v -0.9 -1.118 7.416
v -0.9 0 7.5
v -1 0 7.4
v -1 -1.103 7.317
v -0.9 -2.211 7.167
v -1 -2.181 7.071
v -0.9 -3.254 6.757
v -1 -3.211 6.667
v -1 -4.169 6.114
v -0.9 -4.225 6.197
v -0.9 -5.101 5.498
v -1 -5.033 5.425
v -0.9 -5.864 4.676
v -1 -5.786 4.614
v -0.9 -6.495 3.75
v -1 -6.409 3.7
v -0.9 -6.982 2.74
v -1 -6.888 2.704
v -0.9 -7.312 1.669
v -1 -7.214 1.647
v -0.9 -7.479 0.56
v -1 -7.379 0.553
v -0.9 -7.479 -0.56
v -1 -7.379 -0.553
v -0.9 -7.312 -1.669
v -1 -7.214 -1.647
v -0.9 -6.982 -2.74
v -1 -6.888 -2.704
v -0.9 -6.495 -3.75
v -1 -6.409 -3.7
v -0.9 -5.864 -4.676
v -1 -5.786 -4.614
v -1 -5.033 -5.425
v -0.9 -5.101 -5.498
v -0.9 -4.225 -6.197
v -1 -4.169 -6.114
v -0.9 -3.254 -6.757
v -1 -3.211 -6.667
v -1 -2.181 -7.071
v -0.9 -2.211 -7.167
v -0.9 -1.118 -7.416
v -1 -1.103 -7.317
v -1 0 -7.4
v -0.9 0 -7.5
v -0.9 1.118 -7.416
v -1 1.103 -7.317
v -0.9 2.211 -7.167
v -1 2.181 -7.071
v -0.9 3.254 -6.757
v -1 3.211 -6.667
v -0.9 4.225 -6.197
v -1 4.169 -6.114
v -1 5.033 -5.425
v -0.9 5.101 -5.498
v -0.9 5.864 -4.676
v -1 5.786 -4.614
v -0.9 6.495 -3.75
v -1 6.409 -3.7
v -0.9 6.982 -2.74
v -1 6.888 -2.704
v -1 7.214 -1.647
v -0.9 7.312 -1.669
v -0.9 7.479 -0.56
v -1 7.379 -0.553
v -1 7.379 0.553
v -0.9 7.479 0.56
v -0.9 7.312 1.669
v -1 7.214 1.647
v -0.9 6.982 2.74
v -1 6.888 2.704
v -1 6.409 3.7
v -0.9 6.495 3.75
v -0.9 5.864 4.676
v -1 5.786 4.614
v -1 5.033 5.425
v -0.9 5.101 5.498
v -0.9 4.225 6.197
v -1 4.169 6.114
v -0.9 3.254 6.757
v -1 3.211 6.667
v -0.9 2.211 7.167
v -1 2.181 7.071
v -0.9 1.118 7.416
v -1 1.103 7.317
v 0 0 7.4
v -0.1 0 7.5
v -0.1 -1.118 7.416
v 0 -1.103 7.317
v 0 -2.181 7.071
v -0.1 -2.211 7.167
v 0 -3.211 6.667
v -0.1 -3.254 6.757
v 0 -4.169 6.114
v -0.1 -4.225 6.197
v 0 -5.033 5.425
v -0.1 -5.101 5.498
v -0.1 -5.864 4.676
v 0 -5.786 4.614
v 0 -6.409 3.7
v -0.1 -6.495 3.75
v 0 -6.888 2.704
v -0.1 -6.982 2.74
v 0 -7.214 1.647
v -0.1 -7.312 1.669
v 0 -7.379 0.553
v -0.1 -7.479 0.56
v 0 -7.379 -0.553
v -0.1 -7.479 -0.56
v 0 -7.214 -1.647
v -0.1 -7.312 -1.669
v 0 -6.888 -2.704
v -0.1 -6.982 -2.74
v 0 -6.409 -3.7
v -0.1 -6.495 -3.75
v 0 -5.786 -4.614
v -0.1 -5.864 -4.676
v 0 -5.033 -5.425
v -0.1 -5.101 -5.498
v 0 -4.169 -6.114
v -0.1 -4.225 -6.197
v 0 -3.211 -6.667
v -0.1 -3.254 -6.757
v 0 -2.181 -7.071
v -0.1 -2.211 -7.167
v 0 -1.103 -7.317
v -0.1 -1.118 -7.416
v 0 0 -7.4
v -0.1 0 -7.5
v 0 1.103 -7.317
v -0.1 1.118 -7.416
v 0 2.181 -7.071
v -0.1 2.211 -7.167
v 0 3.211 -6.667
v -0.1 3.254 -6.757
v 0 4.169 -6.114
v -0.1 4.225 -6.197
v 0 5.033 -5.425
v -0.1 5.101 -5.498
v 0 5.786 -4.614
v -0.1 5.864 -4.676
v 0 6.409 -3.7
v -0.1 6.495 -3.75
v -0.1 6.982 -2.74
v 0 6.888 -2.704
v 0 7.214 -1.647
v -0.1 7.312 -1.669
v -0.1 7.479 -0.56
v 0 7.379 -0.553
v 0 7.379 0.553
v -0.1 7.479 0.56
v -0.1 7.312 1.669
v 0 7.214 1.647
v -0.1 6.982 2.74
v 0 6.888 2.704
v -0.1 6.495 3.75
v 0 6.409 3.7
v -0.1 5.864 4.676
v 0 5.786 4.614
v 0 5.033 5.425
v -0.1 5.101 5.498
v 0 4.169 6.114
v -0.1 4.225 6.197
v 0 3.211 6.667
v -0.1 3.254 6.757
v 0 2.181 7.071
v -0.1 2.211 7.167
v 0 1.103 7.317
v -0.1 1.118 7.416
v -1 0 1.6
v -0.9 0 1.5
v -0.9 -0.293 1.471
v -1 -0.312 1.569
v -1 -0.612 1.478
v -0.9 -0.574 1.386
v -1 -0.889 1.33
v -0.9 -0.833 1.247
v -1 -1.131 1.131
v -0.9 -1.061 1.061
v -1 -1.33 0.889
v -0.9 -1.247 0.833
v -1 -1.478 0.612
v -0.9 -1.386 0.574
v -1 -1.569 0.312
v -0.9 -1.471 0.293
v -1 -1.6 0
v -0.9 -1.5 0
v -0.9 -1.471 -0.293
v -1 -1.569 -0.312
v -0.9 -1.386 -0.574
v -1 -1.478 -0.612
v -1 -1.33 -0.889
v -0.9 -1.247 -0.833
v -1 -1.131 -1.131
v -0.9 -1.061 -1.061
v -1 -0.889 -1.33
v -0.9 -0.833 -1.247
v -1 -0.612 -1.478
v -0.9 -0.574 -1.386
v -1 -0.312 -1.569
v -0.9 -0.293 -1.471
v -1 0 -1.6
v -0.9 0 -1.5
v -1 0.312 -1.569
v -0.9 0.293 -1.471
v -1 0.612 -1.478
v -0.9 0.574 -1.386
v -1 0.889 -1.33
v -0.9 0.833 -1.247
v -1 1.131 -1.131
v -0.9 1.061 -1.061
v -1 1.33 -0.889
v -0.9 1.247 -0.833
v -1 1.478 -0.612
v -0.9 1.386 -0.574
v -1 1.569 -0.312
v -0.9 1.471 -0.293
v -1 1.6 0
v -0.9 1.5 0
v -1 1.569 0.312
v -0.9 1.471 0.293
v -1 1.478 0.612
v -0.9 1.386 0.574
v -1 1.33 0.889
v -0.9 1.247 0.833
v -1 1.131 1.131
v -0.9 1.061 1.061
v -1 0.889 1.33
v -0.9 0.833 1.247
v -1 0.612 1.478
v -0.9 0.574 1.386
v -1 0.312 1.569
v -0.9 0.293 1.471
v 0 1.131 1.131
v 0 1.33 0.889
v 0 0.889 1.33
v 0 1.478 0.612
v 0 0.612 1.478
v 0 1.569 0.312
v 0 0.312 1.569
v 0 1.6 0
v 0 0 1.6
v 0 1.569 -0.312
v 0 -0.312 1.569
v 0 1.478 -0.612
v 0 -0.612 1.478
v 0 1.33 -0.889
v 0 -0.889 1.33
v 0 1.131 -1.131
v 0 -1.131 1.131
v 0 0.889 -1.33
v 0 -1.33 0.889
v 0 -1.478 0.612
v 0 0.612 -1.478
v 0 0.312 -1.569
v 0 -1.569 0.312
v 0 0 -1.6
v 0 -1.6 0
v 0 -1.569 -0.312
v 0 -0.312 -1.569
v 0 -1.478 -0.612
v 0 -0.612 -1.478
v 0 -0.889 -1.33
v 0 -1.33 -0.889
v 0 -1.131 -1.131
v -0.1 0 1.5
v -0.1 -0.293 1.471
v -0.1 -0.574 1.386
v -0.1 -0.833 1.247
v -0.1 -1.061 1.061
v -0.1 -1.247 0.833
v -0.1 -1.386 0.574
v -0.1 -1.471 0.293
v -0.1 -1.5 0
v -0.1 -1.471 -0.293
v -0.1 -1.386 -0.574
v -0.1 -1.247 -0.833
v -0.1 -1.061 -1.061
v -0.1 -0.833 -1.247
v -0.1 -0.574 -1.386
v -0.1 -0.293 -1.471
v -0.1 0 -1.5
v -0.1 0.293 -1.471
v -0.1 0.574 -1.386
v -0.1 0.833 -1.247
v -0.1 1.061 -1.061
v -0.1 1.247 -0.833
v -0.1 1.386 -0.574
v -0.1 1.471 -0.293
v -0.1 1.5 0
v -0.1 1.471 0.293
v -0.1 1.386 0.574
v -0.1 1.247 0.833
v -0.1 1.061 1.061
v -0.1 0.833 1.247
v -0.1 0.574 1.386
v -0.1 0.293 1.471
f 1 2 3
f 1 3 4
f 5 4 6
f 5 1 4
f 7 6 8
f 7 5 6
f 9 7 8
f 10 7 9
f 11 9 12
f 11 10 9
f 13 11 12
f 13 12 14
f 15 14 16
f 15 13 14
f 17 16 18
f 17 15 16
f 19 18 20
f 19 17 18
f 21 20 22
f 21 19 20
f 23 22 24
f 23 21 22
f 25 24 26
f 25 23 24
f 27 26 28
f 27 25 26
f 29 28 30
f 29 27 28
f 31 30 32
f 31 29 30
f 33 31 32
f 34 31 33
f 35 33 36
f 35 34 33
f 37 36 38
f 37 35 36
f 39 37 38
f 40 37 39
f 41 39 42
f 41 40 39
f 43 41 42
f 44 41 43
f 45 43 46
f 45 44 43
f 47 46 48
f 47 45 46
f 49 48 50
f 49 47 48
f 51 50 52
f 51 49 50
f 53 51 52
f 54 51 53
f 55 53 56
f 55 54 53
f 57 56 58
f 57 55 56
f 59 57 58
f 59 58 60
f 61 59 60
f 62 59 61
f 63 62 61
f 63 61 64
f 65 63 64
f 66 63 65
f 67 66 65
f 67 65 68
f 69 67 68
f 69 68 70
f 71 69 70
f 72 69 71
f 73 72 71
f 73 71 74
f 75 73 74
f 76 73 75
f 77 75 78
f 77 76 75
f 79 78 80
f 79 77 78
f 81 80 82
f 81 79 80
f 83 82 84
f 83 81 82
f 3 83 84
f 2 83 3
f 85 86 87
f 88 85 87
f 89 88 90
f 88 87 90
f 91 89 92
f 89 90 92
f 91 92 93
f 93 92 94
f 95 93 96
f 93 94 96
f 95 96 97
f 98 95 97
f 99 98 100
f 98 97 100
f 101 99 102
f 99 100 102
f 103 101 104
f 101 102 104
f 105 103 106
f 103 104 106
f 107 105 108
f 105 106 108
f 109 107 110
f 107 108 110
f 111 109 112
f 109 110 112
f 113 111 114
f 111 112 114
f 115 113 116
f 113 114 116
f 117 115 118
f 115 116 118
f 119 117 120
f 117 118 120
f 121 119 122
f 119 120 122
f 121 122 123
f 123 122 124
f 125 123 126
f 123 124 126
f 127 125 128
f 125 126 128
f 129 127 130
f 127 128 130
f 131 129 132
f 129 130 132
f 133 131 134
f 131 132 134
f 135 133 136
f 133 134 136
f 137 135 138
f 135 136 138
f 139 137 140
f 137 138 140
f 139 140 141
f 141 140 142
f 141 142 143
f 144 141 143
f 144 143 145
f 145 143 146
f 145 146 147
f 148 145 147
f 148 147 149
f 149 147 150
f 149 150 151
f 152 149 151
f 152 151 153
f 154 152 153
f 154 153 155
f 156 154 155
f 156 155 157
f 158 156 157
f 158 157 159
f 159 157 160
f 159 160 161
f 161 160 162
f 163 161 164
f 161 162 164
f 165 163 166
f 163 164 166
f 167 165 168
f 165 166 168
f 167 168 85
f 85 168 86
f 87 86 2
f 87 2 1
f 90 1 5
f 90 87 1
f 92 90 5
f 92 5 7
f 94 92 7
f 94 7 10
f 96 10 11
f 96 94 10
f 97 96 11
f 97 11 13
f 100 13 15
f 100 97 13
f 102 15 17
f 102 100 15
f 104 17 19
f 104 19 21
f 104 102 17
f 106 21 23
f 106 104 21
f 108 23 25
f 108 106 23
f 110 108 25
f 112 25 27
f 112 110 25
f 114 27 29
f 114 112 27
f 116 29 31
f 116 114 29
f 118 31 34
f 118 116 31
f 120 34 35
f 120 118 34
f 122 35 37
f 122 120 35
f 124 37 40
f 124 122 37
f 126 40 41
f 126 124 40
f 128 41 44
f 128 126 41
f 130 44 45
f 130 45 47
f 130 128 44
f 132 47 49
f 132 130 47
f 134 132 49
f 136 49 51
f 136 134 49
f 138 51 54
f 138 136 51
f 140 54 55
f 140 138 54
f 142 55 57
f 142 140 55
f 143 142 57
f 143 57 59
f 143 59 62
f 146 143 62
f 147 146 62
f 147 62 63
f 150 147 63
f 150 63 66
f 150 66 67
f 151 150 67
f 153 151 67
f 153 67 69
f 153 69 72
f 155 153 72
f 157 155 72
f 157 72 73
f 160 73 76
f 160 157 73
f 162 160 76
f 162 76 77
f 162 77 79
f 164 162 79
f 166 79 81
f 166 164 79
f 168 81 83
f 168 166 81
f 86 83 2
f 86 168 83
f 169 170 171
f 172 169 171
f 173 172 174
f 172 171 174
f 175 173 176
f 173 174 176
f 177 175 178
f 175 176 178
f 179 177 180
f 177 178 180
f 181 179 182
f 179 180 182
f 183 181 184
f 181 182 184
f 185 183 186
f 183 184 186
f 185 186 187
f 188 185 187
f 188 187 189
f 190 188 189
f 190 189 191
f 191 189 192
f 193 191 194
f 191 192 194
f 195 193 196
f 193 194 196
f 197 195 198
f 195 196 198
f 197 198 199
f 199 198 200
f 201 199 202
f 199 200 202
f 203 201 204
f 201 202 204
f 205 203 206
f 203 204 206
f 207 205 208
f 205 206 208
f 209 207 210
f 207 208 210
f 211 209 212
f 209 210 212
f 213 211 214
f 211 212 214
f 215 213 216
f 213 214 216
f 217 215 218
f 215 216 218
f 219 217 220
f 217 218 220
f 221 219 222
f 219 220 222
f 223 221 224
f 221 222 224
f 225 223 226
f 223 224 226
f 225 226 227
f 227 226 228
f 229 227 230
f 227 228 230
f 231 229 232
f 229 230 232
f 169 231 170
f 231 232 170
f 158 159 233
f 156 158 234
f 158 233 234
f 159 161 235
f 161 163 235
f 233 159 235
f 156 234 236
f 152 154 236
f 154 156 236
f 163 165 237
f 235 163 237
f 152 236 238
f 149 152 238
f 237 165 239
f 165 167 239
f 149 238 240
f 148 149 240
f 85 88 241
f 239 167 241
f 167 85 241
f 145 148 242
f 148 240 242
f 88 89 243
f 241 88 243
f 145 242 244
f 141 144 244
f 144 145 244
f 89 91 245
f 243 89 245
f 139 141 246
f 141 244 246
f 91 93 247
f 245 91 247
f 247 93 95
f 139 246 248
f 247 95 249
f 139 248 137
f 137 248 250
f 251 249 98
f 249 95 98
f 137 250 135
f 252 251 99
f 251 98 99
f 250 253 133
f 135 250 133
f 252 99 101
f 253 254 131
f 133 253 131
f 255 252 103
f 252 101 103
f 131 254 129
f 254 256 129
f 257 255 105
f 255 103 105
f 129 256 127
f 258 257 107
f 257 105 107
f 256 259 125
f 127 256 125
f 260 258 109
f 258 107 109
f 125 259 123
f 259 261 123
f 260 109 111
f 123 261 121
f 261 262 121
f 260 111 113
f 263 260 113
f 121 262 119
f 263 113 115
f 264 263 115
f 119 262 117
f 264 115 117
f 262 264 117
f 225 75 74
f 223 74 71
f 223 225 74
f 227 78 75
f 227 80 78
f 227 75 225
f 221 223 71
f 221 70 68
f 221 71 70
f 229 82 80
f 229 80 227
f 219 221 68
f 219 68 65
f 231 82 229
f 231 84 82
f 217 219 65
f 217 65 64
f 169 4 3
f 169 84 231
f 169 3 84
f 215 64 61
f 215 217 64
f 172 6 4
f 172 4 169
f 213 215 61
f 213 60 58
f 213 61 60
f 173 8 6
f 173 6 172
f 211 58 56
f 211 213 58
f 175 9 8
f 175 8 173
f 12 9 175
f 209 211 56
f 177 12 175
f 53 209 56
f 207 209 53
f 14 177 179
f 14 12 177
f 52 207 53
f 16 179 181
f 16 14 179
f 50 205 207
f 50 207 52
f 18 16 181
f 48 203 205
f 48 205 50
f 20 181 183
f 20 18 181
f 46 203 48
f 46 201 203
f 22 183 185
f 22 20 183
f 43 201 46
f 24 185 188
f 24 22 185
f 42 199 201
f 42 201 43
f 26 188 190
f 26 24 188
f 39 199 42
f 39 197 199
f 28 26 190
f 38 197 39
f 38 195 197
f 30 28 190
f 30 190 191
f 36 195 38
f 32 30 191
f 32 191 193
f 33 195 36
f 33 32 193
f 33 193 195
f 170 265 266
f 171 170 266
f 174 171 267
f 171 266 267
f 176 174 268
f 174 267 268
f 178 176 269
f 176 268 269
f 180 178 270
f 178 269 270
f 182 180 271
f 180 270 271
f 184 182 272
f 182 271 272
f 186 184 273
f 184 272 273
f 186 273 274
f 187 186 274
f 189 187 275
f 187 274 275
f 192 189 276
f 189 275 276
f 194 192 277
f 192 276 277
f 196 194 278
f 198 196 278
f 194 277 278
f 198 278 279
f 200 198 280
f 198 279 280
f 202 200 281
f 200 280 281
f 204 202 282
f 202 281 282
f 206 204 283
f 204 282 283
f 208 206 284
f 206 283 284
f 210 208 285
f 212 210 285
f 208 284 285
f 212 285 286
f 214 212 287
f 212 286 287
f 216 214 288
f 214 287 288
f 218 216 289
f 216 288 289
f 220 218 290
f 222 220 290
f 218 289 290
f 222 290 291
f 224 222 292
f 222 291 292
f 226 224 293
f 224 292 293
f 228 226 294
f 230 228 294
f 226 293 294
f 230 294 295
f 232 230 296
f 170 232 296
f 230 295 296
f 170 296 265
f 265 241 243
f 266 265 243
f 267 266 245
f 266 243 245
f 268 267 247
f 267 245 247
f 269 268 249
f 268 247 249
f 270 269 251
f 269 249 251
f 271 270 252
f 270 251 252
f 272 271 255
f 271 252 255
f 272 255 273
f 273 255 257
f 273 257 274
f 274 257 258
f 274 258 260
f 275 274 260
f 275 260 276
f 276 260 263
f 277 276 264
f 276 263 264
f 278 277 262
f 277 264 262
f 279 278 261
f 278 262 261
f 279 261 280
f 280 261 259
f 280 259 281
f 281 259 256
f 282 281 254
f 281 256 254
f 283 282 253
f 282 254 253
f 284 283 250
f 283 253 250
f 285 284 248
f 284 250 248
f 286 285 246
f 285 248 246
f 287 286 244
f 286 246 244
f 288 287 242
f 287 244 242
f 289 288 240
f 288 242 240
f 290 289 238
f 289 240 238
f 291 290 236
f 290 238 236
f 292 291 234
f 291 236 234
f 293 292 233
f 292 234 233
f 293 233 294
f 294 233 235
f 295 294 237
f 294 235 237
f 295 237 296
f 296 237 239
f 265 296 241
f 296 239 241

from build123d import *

# Parameters (mm, degrees)
SKETCH_1_W     = 1
SKETCH_1_H     = 6
CHAMFER_1_SIZE = 0.1


with BuildPart() as part:
    # 草图1 → 旋转1 (revolve)
    with BuildSketch(Plane.XY, mode=Mode.PRIVATE) as revolve_1_sk:
        with Locations((-0.5, 4.5)):
            Rectangle(SKETCH_1_W, SKETCH_1_H)
    revolve(revolve_1_sk.sketch.rotate(Axis((-11.624698891, 0, 0), (1, 0, 0)), 90), axis=Axis((-11.624698891, 0, 0), (1, 0, 0)))

    # 倒角1
    chamfer_1_edges = [part.edges().sort_by_distance(p)[0] for p in [
        (-1, 0, -1.5),
        (-1, 0, -7.5),
        (0, 0, -7.5),
        (0, 0, -1.5),
    ]]
    chamfer(chamfer_1_edges, length=CHAMFER_1_SIZE)


solid = part.part
